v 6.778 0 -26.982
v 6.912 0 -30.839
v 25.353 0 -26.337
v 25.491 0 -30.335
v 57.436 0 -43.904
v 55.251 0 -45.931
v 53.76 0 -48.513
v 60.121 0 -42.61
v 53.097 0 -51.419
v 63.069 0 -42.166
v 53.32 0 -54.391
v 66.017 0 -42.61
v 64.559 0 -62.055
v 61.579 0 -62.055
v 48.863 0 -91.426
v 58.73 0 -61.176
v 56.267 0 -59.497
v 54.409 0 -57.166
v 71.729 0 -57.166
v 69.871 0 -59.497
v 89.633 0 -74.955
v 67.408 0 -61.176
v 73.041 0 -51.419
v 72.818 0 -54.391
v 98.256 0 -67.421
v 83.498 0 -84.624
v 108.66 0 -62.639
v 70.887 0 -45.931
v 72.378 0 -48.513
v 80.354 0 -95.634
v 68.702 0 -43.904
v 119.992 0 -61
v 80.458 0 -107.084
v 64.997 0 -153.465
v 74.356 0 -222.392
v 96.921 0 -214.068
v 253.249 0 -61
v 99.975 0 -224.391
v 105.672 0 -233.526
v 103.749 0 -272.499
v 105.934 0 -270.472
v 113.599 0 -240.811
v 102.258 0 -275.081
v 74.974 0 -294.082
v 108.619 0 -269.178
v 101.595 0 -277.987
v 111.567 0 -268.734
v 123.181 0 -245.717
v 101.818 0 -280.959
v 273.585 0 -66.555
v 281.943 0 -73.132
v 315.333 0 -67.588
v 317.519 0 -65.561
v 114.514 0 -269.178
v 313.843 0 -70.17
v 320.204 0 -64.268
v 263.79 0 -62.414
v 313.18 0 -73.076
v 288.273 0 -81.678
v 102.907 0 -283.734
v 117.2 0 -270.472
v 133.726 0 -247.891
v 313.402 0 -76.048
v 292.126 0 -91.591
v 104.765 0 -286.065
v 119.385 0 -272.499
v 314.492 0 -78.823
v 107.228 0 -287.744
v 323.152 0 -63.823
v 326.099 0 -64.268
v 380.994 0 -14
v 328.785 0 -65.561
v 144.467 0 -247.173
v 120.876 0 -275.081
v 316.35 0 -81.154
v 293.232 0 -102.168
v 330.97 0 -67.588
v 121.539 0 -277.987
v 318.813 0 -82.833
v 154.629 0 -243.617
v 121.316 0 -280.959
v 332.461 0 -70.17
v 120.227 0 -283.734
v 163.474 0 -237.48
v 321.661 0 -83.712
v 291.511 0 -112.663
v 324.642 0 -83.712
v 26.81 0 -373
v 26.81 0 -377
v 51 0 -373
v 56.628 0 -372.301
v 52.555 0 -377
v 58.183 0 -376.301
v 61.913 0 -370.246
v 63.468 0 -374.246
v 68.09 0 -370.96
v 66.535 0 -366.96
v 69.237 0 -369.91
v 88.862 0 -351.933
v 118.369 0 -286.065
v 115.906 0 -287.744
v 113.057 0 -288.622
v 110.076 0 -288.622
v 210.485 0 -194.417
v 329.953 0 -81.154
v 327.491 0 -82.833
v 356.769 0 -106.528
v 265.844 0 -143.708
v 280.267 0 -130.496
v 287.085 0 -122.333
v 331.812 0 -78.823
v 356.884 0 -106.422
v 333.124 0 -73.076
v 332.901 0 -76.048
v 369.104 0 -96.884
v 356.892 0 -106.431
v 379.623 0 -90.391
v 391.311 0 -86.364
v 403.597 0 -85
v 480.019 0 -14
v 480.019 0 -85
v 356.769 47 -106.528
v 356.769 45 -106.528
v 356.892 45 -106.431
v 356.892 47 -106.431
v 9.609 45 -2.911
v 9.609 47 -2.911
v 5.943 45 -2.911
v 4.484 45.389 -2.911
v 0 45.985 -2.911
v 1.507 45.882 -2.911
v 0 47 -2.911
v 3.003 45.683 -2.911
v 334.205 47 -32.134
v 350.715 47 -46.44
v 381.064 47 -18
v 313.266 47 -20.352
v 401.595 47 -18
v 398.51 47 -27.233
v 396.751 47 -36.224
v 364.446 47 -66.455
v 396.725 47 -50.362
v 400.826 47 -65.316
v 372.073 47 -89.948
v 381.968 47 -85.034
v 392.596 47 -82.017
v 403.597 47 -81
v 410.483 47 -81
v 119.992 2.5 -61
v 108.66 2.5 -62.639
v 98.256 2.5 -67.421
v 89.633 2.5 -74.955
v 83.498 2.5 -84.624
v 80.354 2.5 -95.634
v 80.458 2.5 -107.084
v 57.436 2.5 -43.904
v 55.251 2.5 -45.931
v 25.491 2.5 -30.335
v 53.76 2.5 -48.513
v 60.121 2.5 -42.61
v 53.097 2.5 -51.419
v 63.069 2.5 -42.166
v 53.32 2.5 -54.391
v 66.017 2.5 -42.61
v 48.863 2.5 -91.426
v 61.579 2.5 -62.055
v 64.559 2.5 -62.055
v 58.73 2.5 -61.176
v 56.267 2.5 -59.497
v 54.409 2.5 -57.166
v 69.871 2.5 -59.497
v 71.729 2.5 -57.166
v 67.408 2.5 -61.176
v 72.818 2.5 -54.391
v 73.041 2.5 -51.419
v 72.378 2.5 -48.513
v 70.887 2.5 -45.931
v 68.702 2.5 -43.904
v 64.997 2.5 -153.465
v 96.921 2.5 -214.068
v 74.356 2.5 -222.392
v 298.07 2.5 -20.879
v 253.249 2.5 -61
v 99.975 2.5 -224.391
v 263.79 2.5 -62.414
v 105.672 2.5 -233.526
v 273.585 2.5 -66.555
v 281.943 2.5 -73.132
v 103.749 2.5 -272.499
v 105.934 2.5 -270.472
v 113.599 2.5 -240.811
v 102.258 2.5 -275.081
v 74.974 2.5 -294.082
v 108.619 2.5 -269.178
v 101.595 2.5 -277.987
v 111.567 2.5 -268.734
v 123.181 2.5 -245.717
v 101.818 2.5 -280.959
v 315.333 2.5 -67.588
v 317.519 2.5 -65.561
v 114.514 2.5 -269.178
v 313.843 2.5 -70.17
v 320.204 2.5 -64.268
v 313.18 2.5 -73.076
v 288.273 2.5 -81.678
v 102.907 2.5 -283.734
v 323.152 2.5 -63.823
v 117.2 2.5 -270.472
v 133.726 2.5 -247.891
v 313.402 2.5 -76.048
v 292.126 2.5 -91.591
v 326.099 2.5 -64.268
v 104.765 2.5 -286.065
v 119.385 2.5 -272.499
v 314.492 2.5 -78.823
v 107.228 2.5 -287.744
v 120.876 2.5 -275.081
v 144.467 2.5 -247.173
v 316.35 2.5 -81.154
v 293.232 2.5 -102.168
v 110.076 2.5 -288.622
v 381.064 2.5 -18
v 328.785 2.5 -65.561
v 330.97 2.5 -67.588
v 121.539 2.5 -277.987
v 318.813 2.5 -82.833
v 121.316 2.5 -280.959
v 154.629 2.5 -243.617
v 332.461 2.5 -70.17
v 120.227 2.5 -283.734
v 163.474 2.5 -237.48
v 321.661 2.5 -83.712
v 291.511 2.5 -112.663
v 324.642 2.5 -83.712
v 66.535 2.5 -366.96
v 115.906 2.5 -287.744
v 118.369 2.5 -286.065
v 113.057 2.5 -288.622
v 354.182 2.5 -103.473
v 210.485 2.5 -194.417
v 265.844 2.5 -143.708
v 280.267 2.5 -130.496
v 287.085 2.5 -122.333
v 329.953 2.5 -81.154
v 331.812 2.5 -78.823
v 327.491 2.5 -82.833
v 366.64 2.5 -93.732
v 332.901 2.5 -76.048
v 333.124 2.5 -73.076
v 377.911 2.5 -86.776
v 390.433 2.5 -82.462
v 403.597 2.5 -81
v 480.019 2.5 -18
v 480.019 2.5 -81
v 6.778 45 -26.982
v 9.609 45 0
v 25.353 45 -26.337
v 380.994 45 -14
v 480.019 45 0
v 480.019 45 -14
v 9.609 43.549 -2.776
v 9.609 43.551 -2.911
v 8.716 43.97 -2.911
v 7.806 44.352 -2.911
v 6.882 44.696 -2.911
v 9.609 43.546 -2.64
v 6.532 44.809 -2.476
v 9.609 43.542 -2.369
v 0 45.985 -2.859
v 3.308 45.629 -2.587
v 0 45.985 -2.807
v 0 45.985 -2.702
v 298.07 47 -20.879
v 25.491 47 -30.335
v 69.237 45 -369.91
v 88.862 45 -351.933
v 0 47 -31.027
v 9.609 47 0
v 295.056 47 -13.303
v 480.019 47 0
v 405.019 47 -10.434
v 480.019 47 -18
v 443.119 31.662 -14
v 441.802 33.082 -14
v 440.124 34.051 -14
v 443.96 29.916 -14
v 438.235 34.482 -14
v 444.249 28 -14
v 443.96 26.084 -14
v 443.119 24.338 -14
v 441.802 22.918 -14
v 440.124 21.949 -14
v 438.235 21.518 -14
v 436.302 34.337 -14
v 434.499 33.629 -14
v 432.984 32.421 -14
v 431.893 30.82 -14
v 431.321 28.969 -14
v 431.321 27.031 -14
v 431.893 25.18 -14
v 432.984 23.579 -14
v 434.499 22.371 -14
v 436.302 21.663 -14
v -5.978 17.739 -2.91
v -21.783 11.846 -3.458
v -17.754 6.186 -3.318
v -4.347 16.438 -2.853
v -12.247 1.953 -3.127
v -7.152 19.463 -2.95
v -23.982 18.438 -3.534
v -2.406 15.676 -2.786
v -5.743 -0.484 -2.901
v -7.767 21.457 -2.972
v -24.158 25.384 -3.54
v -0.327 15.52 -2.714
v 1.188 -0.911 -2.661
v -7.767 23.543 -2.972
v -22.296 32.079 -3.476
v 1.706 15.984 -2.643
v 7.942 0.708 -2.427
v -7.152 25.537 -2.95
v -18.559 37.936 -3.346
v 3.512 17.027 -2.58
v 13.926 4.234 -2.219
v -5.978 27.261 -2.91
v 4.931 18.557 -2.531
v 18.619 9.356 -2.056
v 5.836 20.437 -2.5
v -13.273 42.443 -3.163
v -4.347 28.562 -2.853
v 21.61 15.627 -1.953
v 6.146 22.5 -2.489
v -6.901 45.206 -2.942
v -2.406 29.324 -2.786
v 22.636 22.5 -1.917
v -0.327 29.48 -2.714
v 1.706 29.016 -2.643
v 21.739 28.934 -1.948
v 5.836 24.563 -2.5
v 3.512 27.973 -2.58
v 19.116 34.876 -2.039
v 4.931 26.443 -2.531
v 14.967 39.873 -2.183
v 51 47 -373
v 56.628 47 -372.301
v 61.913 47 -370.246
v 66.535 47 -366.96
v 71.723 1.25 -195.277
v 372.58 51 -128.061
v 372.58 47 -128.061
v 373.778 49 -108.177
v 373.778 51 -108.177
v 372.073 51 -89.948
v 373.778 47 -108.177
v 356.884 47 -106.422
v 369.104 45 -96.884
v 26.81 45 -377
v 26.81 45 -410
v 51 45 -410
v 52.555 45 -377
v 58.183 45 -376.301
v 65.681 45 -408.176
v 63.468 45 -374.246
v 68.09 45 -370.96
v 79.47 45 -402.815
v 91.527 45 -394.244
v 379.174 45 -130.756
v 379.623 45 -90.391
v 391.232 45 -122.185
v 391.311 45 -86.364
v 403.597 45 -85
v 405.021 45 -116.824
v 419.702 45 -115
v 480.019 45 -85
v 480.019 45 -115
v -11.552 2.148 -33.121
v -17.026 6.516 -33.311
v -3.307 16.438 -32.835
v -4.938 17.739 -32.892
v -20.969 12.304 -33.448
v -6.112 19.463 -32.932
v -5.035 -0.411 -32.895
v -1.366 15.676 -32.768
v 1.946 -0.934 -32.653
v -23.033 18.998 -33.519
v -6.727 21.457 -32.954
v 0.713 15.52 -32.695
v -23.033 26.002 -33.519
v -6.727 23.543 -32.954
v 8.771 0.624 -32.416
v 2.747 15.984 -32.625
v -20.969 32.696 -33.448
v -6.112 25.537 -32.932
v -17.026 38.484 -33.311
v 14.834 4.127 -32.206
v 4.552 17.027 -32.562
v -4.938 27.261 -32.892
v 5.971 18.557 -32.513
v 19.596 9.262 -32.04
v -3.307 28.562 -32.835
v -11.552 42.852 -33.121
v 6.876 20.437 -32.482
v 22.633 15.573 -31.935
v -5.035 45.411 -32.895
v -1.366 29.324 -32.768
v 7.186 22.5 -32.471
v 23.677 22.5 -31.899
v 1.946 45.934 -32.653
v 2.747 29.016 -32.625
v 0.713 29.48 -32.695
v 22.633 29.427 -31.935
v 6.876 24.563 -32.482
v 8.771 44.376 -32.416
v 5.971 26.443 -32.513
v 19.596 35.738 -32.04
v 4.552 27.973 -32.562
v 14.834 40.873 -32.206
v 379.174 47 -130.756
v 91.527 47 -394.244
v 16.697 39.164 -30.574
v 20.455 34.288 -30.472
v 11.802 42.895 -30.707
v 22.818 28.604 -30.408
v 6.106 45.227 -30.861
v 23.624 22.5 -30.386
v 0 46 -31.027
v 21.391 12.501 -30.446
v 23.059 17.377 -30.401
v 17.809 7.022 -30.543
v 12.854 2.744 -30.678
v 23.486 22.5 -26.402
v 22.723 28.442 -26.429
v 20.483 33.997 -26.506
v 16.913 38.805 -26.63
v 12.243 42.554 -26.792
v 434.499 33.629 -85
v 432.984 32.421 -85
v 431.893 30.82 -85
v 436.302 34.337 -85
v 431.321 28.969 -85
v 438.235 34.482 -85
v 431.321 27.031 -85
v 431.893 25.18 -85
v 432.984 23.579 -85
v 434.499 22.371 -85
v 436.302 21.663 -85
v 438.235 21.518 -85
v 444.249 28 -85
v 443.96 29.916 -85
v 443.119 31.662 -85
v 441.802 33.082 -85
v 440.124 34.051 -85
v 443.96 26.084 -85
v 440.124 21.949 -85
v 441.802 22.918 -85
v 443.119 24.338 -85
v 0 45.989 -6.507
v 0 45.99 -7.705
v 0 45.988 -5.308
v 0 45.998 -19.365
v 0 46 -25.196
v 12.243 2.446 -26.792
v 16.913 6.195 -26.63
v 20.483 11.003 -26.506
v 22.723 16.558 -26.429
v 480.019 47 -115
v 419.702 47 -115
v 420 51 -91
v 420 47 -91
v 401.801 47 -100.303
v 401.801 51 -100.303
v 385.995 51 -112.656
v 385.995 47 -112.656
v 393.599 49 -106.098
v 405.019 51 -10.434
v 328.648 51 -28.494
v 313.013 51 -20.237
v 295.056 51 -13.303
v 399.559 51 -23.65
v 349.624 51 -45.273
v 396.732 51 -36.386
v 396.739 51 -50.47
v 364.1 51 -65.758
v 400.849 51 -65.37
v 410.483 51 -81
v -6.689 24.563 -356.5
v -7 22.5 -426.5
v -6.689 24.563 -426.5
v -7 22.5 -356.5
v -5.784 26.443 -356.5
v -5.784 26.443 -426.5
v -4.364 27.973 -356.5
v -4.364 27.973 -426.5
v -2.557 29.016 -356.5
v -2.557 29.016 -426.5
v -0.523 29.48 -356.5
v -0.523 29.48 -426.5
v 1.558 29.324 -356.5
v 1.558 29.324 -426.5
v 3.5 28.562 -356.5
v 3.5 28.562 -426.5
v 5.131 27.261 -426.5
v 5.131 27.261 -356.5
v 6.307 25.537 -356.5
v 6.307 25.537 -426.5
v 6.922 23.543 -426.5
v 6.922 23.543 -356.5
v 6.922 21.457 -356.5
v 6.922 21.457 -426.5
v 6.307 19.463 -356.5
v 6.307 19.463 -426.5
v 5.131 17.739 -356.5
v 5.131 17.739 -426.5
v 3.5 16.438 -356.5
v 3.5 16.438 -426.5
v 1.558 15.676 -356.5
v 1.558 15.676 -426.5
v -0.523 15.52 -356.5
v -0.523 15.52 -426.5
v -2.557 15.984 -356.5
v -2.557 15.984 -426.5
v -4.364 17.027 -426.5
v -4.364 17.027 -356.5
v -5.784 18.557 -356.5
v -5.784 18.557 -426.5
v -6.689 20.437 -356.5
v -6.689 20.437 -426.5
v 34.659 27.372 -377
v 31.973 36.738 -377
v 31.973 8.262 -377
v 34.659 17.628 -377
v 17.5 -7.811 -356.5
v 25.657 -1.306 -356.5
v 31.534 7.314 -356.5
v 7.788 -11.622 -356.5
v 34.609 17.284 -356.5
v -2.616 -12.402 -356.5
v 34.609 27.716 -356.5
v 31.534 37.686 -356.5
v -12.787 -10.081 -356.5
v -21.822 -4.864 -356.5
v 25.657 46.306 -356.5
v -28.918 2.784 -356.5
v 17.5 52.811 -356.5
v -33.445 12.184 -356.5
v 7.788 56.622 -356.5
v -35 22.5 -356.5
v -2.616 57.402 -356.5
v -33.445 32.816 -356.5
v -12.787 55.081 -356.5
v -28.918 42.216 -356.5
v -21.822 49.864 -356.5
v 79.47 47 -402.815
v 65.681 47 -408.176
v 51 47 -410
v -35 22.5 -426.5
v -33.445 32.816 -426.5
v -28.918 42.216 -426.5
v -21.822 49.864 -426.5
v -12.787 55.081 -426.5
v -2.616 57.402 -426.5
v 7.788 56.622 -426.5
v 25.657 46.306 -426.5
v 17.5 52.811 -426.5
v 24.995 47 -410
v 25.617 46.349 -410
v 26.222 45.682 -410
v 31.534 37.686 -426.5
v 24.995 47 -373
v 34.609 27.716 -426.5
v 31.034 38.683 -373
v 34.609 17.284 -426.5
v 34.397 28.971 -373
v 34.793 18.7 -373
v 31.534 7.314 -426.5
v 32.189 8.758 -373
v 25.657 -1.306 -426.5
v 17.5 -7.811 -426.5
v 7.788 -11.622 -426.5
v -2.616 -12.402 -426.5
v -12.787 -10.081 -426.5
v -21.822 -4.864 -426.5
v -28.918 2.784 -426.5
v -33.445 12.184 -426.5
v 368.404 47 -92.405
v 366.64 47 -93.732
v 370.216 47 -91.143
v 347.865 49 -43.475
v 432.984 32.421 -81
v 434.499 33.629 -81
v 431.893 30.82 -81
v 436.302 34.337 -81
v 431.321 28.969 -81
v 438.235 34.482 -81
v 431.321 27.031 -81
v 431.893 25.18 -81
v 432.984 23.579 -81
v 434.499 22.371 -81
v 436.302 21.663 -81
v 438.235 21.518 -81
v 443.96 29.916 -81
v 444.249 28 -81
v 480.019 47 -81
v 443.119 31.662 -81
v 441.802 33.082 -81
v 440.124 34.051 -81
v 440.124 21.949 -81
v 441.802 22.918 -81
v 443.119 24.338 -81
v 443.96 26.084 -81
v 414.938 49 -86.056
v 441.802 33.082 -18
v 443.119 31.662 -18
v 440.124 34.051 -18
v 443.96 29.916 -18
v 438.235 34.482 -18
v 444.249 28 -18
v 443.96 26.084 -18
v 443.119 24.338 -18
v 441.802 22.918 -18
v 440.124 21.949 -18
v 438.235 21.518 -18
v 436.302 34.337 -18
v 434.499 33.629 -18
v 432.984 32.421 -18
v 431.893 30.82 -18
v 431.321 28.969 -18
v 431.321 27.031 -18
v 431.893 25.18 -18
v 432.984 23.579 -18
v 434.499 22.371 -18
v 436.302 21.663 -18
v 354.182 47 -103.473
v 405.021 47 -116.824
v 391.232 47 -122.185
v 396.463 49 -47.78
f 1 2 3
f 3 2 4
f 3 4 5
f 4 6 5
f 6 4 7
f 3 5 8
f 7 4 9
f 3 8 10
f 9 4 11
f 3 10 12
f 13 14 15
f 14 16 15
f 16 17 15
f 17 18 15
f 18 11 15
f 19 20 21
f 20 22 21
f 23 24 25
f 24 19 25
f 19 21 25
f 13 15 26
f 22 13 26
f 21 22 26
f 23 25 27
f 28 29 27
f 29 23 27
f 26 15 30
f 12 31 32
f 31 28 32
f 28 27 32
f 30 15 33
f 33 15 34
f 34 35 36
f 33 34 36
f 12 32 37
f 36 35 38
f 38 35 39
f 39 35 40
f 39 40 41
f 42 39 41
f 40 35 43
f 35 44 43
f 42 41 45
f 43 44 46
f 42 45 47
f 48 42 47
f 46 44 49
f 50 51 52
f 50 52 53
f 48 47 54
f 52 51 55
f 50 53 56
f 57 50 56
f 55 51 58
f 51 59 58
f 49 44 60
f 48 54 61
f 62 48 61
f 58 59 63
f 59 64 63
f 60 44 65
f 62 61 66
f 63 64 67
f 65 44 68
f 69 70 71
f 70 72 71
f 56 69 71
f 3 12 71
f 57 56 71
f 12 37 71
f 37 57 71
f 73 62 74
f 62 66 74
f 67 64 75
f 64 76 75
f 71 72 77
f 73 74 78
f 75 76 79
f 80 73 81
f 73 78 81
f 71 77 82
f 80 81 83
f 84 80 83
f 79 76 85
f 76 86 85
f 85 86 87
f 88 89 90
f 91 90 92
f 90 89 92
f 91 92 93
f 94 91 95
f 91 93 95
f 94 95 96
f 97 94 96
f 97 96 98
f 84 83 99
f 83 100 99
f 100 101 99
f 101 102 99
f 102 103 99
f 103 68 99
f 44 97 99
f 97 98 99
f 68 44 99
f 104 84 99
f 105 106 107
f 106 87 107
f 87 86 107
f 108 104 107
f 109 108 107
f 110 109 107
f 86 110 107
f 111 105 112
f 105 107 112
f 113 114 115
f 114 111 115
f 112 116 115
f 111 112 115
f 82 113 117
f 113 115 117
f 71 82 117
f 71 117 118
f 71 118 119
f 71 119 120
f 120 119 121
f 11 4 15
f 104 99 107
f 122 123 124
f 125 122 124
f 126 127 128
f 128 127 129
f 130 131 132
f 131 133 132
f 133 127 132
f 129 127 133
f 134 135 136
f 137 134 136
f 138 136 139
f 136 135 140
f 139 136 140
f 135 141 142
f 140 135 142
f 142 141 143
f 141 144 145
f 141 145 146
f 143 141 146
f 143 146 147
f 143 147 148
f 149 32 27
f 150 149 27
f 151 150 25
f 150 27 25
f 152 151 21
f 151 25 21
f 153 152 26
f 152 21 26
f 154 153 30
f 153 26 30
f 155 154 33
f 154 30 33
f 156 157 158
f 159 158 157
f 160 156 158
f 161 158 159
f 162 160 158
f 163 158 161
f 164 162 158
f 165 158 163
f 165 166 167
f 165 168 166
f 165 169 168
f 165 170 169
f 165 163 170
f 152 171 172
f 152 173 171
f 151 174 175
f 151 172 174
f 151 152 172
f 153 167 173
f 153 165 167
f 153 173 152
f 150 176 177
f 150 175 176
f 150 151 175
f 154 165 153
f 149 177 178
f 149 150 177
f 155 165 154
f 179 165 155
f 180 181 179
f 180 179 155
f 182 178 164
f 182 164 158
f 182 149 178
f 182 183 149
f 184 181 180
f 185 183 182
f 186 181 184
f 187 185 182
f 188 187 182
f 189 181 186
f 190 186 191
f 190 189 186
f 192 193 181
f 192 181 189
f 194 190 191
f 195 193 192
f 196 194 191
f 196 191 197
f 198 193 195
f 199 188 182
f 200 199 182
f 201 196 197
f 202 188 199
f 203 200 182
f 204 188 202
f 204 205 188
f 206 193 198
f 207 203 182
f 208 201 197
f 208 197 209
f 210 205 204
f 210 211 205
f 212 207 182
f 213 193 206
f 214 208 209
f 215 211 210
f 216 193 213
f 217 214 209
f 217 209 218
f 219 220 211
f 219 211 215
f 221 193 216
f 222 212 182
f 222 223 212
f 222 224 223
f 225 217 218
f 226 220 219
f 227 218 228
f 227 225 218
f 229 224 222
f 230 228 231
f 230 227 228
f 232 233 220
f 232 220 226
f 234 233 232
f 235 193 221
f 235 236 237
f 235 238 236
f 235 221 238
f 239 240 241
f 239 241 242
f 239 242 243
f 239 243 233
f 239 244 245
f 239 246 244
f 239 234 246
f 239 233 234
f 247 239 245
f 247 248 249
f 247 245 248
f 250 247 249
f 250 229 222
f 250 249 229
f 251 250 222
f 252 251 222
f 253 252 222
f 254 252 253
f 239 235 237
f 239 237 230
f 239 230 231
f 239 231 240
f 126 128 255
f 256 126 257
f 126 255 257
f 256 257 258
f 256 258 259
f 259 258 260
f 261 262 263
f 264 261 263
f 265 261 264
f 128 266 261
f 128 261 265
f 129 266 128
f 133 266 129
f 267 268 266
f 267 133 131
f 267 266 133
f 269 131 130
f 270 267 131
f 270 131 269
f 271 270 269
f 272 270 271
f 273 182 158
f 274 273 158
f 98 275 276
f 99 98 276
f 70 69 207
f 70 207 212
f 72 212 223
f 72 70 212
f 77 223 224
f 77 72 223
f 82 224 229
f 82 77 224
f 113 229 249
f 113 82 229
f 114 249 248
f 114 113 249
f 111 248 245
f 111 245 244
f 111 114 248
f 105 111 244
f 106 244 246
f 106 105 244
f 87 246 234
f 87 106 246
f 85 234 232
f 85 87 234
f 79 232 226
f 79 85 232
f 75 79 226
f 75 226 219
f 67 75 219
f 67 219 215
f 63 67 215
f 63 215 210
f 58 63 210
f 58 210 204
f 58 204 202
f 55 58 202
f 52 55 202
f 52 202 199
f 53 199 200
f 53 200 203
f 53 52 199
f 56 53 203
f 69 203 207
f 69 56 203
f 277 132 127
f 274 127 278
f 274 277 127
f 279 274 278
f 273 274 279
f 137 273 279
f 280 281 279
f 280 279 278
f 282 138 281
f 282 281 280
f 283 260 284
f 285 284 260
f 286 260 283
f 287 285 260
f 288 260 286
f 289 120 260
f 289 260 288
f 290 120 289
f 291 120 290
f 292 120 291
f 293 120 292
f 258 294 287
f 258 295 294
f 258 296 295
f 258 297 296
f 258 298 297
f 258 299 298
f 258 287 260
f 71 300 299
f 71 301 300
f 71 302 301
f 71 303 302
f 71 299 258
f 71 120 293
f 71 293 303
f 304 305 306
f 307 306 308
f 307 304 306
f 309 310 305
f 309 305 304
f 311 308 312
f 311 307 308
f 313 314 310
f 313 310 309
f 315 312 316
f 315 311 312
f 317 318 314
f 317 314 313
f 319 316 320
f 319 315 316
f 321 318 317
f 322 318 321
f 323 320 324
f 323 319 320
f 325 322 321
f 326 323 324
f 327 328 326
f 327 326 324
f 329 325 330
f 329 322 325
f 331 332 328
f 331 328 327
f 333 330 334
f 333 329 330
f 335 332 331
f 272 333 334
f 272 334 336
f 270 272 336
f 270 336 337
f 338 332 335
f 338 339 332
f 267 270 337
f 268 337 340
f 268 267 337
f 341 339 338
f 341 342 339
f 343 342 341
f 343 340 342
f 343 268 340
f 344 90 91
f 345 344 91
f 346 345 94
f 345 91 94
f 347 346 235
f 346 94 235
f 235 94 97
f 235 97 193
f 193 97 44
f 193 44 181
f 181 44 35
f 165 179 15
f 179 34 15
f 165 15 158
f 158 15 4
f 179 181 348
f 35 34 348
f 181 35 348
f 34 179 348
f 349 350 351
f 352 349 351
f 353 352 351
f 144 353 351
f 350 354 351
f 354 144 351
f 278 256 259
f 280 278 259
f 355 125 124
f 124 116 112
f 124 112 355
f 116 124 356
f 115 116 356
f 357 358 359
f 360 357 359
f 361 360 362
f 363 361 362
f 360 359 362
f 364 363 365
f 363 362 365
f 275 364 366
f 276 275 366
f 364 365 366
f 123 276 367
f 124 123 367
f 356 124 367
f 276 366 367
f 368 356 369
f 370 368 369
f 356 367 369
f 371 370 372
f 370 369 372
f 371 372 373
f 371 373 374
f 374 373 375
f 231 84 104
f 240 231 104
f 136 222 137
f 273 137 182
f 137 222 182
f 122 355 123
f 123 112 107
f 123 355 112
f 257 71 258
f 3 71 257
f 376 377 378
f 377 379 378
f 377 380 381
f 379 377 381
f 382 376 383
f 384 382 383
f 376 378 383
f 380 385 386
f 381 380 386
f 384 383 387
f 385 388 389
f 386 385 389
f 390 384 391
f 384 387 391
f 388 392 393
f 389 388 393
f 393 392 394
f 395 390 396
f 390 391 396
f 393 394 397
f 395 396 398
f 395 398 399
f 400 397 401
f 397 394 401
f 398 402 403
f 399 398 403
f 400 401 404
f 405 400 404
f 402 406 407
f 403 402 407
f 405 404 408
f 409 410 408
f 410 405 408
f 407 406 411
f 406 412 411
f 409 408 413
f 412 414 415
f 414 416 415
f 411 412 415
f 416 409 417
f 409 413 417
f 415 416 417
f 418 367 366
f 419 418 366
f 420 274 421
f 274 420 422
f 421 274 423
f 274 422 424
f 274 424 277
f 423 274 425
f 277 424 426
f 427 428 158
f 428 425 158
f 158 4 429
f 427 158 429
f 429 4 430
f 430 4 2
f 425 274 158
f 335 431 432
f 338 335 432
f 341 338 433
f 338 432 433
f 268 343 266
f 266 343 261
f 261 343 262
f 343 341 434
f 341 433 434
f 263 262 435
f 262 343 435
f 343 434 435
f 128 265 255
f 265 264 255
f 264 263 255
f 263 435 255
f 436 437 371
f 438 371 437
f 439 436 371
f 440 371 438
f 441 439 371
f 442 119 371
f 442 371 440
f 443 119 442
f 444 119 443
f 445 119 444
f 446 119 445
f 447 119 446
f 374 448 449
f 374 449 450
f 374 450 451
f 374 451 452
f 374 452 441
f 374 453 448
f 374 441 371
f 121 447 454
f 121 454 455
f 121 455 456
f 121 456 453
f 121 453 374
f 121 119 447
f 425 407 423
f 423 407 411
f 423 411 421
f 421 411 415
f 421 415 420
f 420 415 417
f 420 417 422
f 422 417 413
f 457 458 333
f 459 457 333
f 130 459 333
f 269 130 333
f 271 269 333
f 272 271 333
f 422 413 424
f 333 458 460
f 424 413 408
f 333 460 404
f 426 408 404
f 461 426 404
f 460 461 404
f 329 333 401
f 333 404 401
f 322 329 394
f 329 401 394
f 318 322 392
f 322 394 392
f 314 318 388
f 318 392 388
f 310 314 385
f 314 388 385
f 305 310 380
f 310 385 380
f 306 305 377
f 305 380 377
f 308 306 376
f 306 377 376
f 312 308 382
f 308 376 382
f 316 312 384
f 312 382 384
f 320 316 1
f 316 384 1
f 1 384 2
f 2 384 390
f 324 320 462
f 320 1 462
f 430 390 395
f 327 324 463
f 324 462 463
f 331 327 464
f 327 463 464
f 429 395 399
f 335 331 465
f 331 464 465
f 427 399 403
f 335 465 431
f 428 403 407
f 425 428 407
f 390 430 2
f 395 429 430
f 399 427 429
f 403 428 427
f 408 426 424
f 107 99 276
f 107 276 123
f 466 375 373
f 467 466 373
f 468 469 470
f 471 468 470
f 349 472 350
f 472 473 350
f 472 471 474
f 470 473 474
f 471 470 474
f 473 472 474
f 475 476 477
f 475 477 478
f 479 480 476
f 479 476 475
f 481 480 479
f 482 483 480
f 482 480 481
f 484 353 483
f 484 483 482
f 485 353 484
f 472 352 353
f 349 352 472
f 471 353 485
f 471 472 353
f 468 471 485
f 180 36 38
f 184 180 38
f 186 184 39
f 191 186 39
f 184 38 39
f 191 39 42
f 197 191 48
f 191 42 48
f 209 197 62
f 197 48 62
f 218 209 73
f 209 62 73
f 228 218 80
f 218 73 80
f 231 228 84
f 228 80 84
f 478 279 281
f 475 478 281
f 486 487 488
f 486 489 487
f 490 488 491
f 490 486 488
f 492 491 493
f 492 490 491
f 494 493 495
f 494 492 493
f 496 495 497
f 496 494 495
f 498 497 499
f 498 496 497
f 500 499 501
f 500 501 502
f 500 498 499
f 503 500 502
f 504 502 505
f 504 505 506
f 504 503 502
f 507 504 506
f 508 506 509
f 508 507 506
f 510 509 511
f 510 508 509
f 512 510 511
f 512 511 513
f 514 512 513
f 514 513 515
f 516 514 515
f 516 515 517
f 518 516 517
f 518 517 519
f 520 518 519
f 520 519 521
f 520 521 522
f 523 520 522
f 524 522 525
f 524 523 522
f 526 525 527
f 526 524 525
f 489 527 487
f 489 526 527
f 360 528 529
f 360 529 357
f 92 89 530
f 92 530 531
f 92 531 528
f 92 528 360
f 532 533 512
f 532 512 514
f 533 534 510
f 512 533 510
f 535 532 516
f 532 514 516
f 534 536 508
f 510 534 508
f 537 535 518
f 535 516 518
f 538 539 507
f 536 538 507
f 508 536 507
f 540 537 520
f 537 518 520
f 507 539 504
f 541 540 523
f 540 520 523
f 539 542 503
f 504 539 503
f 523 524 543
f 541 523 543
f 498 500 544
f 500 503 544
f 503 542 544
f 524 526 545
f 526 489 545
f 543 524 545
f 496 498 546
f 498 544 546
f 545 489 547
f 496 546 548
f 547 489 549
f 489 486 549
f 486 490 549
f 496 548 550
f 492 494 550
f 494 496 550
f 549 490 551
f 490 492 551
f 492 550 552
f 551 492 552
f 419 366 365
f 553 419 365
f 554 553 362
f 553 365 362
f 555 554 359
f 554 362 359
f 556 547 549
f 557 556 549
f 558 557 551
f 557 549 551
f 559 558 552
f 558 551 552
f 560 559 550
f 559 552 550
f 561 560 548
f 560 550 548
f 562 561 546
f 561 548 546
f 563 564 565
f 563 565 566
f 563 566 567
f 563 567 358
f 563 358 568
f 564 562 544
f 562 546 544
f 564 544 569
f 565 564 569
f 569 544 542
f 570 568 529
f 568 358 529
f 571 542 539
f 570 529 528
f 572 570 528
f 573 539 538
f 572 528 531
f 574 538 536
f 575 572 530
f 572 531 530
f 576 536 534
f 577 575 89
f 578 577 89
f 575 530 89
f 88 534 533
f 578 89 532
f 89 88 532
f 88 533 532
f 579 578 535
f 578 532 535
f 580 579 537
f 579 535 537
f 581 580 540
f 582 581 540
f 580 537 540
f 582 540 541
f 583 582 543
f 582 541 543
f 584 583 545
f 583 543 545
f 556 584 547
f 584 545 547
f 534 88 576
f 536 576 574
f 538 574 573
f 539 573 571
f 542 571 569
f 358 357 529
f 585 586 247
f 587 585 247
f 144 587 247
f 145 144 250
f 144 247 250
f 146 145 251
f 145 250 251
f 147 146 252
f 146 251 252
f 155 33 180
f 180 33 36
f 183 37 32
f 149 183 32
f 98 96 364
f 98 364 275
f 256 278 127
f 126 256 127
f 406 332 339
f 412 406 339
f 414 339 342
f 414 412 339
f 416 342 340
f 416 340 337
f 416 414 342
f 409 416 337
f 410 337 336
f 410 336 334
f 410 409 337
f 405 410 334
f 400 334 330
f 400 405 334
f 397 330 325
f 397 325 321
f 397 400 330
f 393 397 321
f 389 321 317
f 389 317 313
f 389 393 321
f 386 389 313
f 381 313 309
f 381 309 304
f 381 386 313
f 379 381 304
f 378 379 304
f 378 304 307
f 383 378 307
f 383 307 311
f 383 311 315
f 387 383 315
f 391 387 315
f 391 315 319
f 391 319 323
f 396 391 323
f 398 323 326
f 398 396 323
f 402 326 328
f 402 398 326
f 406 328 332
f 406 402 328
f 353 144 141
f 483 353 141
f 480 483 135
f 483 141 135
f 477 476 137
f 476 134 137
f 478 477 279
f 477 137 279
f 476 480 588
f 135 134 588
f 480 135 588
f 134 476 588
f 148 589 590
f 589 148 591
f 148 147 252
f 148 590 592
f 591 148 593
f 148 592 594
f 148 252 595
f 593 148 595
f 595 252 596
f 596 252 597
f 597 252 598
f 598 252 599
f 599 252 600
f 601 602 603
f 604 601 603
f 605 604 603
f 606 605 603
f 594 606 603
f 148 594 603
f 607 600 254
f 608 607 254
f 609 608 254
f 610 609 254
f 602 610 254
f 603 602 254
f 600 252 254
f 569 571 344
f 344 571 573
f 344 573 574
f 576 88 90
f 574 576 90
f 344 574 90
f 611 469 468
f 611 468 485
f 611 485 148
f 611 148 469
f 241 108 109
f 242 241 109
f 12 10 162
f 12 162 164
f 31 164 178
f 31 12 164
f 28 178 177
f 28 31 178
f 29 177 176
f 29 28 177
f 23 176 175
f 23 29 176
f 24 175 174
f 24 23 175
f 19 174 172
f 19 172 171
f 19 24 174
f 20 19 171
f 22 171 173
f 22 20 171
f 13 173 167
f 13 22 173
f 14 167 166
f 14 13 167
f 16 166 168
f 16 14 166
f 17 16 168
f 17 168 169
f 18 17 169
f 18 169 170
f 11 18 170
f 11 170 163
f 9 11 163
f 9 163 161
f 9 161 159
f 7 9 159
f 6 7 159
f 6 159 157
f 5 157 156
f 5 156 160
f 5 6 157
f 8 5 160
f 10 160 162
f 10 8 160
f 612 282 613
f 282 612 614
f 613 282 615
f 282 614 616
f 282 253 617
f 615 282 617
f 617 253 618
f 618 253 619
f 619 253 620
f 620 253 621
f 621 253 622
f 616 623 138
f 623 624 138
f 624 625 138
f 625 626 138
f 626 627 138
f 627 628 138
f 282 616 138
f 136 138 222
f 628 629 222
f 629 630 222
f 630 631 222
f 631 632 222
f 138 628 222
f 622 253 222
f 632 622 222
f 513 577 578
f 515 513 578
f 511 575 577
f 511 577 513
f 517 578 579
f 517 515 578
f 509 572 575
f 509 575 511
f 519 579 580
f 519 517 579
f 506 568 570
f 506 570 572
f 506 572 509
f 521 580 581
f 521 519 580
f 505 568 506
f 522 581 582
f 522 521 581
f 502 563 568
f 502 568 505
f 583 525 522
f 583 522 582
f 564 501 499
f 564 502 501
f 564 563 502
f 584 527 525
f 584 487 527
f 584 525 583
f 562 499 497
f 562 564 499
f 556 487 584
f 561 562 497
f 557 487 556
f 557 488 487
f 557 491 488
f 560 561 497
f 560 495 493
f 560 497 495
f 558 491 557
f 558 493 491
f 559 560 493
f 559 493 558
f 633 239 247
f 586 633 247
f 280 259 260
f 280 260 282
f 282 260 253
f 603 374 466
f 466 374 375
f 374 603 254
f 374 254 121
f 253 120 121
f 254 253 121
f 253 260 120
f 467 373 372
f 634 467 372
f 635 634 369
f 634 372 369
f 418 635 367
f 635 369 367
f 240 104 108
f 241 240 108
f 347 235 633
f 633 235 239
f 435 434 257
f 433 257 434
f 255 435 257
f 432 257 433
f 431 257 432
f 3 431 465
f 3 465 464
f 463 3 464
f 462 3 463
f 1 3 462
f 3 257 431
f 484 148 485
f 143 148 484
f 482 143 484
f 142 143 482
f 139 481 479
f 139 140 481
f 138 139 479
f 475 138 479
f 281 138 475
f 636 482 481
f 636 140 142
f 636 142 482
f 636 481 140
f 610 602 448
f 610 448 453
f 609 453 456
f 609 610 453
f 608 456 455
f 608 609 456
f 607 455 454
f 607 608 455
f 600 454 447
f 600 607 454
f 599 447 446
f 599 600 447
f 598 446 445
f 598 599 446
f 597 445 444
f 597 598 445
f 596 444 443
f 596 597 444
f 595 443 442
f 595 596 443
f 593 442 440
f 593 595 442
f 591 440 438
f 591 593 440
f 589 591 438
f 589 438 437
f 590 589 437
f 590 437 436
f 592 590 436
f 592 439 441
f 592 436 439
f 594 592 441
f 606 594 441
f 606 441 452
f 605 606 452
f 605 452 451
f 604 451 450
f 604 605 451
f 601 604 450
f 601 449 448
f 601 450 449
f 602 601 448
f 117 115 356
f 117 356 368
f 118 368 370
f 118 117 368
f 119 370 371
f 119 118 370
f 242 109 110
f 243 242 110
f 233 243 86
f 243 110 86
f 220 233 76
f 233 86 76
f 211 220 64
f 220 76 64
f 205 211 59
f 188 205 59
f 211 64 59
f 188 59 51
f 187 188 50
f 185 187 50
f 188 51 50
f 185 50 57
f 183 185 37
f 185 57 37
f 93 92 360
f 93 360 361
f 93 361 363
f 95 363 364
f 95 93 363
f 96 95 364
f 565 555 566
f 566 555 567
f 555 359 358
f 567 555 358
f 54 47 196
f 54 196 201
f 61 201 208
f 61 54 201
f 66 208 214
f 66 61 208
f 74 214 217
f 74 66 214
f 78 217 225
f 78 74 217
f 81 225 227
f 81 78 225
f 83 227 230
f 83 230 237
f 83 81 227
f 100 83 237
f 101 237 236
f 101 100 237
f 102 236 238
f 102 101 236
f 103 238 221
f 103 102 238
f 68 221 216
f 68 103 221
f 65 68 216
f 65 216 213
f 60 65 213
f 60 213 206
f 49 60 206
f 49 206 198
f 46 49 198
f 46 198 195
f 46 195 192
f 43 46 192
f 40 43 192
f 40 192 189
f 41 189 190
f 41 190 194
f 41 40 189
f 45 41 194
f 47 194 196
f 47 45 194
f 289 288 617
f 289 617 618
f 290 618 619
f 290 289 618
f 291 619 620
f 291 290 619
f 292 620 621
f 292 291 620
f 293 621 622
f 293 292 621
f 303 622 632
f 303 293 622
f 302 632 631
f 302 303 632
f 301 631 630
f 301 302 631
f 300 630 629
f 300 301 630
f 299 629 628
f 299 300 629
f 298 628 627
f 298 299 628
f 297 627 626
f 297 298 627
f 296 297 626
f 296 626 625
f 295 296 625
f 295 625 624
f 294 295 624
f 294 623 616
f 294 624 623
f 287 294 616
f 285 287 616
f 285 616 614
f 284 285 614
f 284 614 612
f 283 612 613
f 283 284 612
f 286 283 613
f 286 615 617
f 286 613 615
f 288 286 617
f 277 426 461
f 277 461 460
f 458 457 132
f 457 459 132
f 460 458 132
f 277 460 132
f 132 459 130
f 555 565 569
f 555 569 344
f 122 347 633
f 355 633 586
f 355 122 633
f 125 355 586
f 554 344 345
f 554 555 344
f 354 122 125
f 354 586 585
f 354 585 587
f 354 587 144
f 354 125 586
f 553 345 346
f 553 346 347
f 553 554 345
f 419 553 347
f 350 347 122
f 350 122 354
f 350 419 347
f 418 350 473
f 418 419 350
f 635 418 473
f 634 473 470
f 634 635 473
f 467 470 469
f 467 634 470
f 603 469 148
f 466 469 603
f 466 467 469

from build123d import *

# Parameters (mm, degrees)
SKETCH_2_R               = 10
EXTRUDE_2_DEPTH          = 2.5
EXTRUDE_3_DEPTH          = 47
EXTRUDE_4_DEPTH          = 47
CUT_EXTRUDE_2_DEPTH      = 45
EXTRUDE_5_DEPTH          = 4
EXTRUDE_6_DEPTH          = 49.5
EXTRUDE_6_DEPTH_BACK     = 20.5
SKETCH_5_R               = 35
EXTRUDE_8_DEPTH          = 24.5
EXTRUDE_8_DEPTH_BACK     = 5.5
SKETCH_6_3_R             = 23.5
SKETCH_6_3_R_2           = 7
CUT_EXTRUDE_4_DEPTH      = 35.5
CUT_EXTRUDE_4_DEPTH_BACK = 24.5
SKETCH_6_R               = 7
CUT_EXTRUDE_5_DEPTH      = 31
CUT_EXTRUDE_5_DEPTH_BACK = 118
CUT_EXTRUDE_7_DEPTH      = 10
SKETCH_13_R              = 23.5
SKETCH_13_R_2            = 7
EXTRUDE_9_DEPTH          = 5
SKETCH_14_R              = 7
CUT_EXTRUDE_8_DEPTH      = 326


with BuildPart() as part:
    # 草图2 → 凸台-拉伸2 (new body)
    with BuildSketch(Plane(origin=(0, 0, 0), x_dir=(1, 0, 0), z_dir=(0, 1, 0))):
        with BuildLine():
            add(Edge.make_bspline(
                [(66.535337275, 366.960093359), (97.433190899, 191.906412215), (25.491327677, 30.335008843)],
                knots=[0, 0, 0, 1, 1, 1], degree=2))
            Line((25.491327677, 30.335008843), (298.070406458, 20.879087079))
            Line((298.070406458, 20.879087079), (381.06378597, 18))
            Line((381.06378597, 18), (480.018834564, 18))
            Line((480.018834564, 18), (480.018834564, 81))
            Line((480.018834564, 81), (403.59654847, 81))
            ThreePointArc((403.59654847, 81), (384.052422459, 84.272342385), (366.640132179, 93.732428718))
            Line((366.640132179, 93.732428718), (354.182306501, 103.472649748))
            Line((354.182306501, 103.472649748), (66.535337275, 366.960093359))
        make_face()
        with Locations((63.069024618, 52.166207095)):
            Circle(SKETCH_2_R, mode=Mode.SUBTRACT)
        with BuildLine():
            Line((210.484938228, 194.417109435), (265.843761834, 143.707884329))
            Line((265.843761834, 143.707884329), (280.267263132, 130.495815747))
            ThreePointArc((280.267263132, 130.495815747), (290.530388989, 86.505736508), (253.248807869, 61.00000121))
            Line((253.248807869, 61.00000121), (167.295718615, 61.00000121))
            Line((167.295718615, 61.00000121), (119.992311174, 61.00000121))
            ThreePointArc((119.992311174, 61.00000121), (89.633225011, 74.955311015), (80.457661489, 107.083706844))
            Line((80.457661489, 107.083706844), (96.920664861, 214.067691653))
            ThreePointArc((96.920664861, 214.067691653), (123.181449566, 245.717320201), (163.47376981, 237.479800556))
            Line((163.47376981, 237.479800556), (210.484938228, 194.417109435))
        make_face(mode=Mode.SUBTRACT)
        with Locations((323.151772468, 73.823254893)):
            Circle(SKETCH_2_R, mode=Mode.SUBTRACT)
        with Locations((111.566817708, 278.73398761)):
            Circle(SKETCH_2_R, mode=Mode.SUBTRACT)
    extrude(amount=EXTRUDE_2_DEPTH)

    # 草图2<4> → 凸台-拉伸3 (add)
    with BuildSketch(Plane(origin=(0, 0, 0), x_dir=(1, 0, 0), z_dir=(0, 1, 0))):
        Polygon((0, 31.026794813), (0, 27.216911211), (380.994425705, 14), (480.018834564, 14), (480.018834564, 18), (381.06378597, 18), (298.070406458, 20.879087079), (25.491327677, 30.335008843), align=None)
        with BuildLine():
            ThreePointArc((50.999725499, 373), (59.333927702, 371.436909143), (66.535337275, 366.960093359))
            Line((66.535337275, 366.960093359), (354.182306501, 103.472649748))
            Line((354.182306501, 103.472649748), (366.640132179, 93.732428718))
            ThreePointArc((366.640132179, 93.732428718), (384.052422459, 84.272342385), (403.59654847, 81))
            Line((403.59654847, 81), (480.018834564, 81))
            Line((480.018834564, 81), (480.018834564, 85))
            Line((480.018834564, 85), (403.59654847, 85))
            ThreePointArc((403.59654847, 85), (385.355364193, 88.054186226), (369.103893265, 96.883600137))
            Line((369.103893265, 96.883600137), (356.892394312, 106.431229232))
            Line((356.892394312, 106.431229232), (356.884152027, 106.422231202))
            Line((356.884152027, 106.422231202), (356.769043373, 106.527671857))
            Line((356.769043373, 106.527671857), (68.090449936, 370.960093359))
            ThreePointArc((68.090449936, 370.960093359), (60.889040363, 375.436909143), (52.554838159, 377))
            Line((52.554838159, 377), (0, 377))
            Line((0, 377), (0, 373))
            Line((0, 373), (50.999725499, 373))
        make_face()
    extrude(amount=EXTRUDE_3_DEPTH)

    # 草图2<6> → 凸台-拉伸4 (add)
    with BuildSketch(Plane(origin=(0, 0, 0), x_dir=(1, 0, 0), z_dir=(0, 1, 0))):
        Polygon((0, 0), (480.018834564, 0), (480.018834564, 13.998527319), (480.018834564, 18), (381.06378597, 18), (298.070406458, 20.879087079), (25.491327677, 30.335008843), (0, 31.026794813), align=None)
        with BuildLine():
            Line((403.59654847, 85), (480.018834564, 85))
            Line((480.018834564, 85), (480.018834564, 115))
            Line((480.018834564, 115), (419.702060514, 115))
            ThreePointArc((419.702060514, 115), (397.96066346, 119.077628321), (379.174377619, 130.756278195))
            Line((379.174377619, 130.756278195), (91.527408393, 394.243721805))
            ThreePointArc((91.527408393, 394.243721805), (72.741122552, 405.922371679), (50.999725499, 410))
            Line((50.999725499, 410), (0, 410))
            Line((0, 410), (0, 377))
            Line((0, 377), (52.554838159, 377))
            ThreePointArc((52.554838159, 377), (60.889040363, 375.436909143), (68.090449936, 370.960093359))
            Line((68.090449936, 370.960093359), (356.769043373, 106.527671857))
            Line((356.769043373, 106.527671857), (369.103893265, 96.883600137))
            ThreePointArc((369.103893265, 96.883600137), (385.355364193, 88.054186226), (403.59654847, 85))
        make_face()
    extrude(amount=EXTRUDE_4_DEPTH)

    # 草图2<8> → 切除-拉伸2 (cut)
    with BuildSketch(Plane(origin=(0, 0, 0), x_dir=(1, 0, 0), z_dir=(0, 1, 0))):
        Polygon((0, 27.216911211), (0, 0), (480.018834564, 0), (480.018834564, 13.998527319), (480.018834564, 14), (380.994425705, 14), align=None)
        with BuildLine():
            Line((403.59654847, 85), (480.018834564, 85))
            Line((480.018834564, 85), (480.018834564, 115))
            Line((480.018834564, 115), (419.702060514, 115))
            ThreePointArc((419.702060514, 115), (397.96066346, 119.077628321), (379.174377619, 130.756278195))
            Line((379.174377619, 130.756278195), (91.527408393, 394.243721805))
            ThreePointArc((91.527408393, 394.243721805), (72.741122552, 405.922371679), (50.999725499, 410))
            Line((50.999725499, 410), (0, 410))
            Line((0, 410), (0, 377))
            Line((0, 377), (52.554838159, 377))
            ThreePointArc((52.554838159, 377), (60.889040363, 375.436909143), (68.090449936, 370.960093359))
            Line((68.090449936, 370.960093359), (356.769043373, 106.527671857))
            Line((356.769043373, 106.527671857), (369.103893265, 96.883600137))
            ThreePointArc((369.103893265, 96.883600137), (385.355364193, 88.054186226), (403.59654847, 85))
        make_face()
    extrude(amount=CUT_EXTRUDE_2_DEPTH, mode=Mode.SUBTRACT)

    # 草图3 → 凸台-拉伸5 (add)
    with BuildSketch(Plane(origin=(0, 47, 0), x_dir=(1, 0, 0), z_dir=(0, 1, 0))):
        with BuildLine():
            Line((295.056115028, 13.302883956), (405.018705009, 10.434294652))
            add(Edge.make_bspline(
                [(405.018705009, 10.434294652), (381.920482995, 56.306840436), (420, 91)],
                knots=[0.140921029, 0.140921029, 0.140921029, 1.140921029, 1.140921029, 1.140921029], degree=2))
            add(Edge.make_bspline(
                [(420, 91), (390.907181835, 102.66550813), (372.580466903, 128.060677104)],
                knots=[0, 0, 0, 1, 1, 1], degree=2))
            add(Edge.make_bspline(
                [(372.580466903, 128.060677104), (383.545524604, 42.338798312), (295.056115028, 13.302883956)],
                knots=[0, 0, 0, 1, 1, 1], degree=2))
        make_face()
    extrude(amount=EXTRUDE_5_DEPTH)

    # 草图5 → 凸台-拉伸6 (add, two sides: drawn at the far end of the back side and taken through both)
    with BuildSketch(Plane(origin=(0, 0, -377), x_dir=(-1, 0, 0), z_dir=(0, 0, -1)).offset(-EXTRUDE_6_DEPTH_BACK)):
        with Locations((0, 22.5)):
            Circle(SKETCH_5_R)
        with BuildLine():
            ThreePointArc((7, 22.5), (4.949747468, 17.550252532), (0, 15.5))
            ThreePointArc((0, 15.5), (-7, 22.5), (0, 29.5))
            ThreePointArc((0, 29.5), (4.949747468, 27.449747468), (7, 22.5))
        make_face(mode=Mode.SUBTRACT)
    extrude(amount=EXTRUDE_6_DEPTH + EXTRUDE_6_DEPTH_BACK)

    # 草图6<3> → 凸台-拉伸8 (add, two sides: drawn at the far end of the back side and taken through both)
    with BuildSketch(Plane(origin=(0.943035097, 0, -27.184196792), x_dir=(0.9993988249637922, 0, 0.03466970811806164), z_dir=(-0.03466970811806164, 0, 0.9993988249637923)).offset(-EXTRUDE_8_DEPTH_BACK)):
        with Locations((-0.943602368, 22.5)):
            Circle(SKETCH_6_3_R)
        with Locations((-0.943602368, 22.5)):
            Circle(SKETCH_6_3_R_2, mode=Mode.SUBTRACT)
    extrude(amount=EXTRUDE_8_DEPTH + EXTRUDE_8_DEPTH_BACK)

    # 草图6 → 切除-拉伸4 (cut, two sides: drawn at the far end of the back side and taken through both)
    with BuildSketch(Plane(origin=(0.943035097, 0, -27.184196792), x_dir=(0.9993988249637922, 0, 0.03466970811806164), z_dir=(-0.03466970811806164, 0, 0.9993988249637923)).offset(-CUT_EXTRUDE_4_DEPTH_BACK)):
        with Locations((-0.943602368, 22.5)):
            Circle(SKETCH_6_R)
    extrude(amount=CUT_EXTRUDE_4_DEPTH + CUT_EXTRUDE_4_DEPTH_BACK, mode=Mode.SUBTRACT)

    # 草图10 → 切除-拉伸5 (cut, two sides: drawn at the far end of the back side and taken through both)
    with BuildSketch(Plane(origin=(0, 0, -85), x_dir=(-1, 0, 0), z_dir=(0, 0, -1)).offset(-CUT_EXTRUDE_5_DEPTH_BACK)):
        with BuildLine():
            ThreePointArc((-437.748834564, 21.5), (-433.152640486, 23.403805922), (-431.248834564, 28))
            ThreePointArc((-431.248834564, 28), (-442.345028641, 32.596194078), (-437.748834564, 21.5))
        make_face()
    extrude(amount=CUT_EXTRUDE_5_DEPTH + CUT_EXTRUDE_5_DEPTH_BACK, mode=Mode.SUBTRACT)

    # 草图12 → 切除-拉伸7 (cut)
    with BuildSketch(Plane(origin=(0, 47, 0), x_dir=(1, 0, 0), z_dir=(0, 1, 0))):
        Polygon((0, 0), (9.608777796, 0), (9.608777796, 2.511490201), (9.608777796, 2.911490201), (5, 2.911490201), (0, 2.911490201), (0, 2.3), align=None)
    extrude(amount=-CUT_EXTRUDE_7_DEPTH, mode=Mode.SUBTRACT)

    # 草图13 → 凸台-拉伸9 (add)
    with BuildSketch(Plane(origin=(0.093627248, 0, -2.698925581), x_dir=(0.9993988249637922, 0, 0.03466970811806163), z_dir=(-0.03466970811806163, 0, 0.9993988249637923))):
        with Locations((-0.943602368, 22.5)):
            Circle(SKETCH_13_R)
        with Locations((-0.943602368, 22.5)):
            Circle(SKETCH_13_R_2, mode=Mode.SUBTRACT)
    extrude(amount=-EXTRUDE_9_DEPTH)

    # 草图14 → 切除-拉伸8 (cut)
    with BuildSketch(Plane(origin=(0, 0, -426.5), x_dir=(-1, 0, 0), z_dir=(0, 0, -1))):
        with Locations((0, 22.5)):
            Circle(SKETCH_14_R)
    extrude(amount=-CUT_EXTRUDE_8_DEPTH, mode=Mode.SUBTRACT)


solid = part.part
